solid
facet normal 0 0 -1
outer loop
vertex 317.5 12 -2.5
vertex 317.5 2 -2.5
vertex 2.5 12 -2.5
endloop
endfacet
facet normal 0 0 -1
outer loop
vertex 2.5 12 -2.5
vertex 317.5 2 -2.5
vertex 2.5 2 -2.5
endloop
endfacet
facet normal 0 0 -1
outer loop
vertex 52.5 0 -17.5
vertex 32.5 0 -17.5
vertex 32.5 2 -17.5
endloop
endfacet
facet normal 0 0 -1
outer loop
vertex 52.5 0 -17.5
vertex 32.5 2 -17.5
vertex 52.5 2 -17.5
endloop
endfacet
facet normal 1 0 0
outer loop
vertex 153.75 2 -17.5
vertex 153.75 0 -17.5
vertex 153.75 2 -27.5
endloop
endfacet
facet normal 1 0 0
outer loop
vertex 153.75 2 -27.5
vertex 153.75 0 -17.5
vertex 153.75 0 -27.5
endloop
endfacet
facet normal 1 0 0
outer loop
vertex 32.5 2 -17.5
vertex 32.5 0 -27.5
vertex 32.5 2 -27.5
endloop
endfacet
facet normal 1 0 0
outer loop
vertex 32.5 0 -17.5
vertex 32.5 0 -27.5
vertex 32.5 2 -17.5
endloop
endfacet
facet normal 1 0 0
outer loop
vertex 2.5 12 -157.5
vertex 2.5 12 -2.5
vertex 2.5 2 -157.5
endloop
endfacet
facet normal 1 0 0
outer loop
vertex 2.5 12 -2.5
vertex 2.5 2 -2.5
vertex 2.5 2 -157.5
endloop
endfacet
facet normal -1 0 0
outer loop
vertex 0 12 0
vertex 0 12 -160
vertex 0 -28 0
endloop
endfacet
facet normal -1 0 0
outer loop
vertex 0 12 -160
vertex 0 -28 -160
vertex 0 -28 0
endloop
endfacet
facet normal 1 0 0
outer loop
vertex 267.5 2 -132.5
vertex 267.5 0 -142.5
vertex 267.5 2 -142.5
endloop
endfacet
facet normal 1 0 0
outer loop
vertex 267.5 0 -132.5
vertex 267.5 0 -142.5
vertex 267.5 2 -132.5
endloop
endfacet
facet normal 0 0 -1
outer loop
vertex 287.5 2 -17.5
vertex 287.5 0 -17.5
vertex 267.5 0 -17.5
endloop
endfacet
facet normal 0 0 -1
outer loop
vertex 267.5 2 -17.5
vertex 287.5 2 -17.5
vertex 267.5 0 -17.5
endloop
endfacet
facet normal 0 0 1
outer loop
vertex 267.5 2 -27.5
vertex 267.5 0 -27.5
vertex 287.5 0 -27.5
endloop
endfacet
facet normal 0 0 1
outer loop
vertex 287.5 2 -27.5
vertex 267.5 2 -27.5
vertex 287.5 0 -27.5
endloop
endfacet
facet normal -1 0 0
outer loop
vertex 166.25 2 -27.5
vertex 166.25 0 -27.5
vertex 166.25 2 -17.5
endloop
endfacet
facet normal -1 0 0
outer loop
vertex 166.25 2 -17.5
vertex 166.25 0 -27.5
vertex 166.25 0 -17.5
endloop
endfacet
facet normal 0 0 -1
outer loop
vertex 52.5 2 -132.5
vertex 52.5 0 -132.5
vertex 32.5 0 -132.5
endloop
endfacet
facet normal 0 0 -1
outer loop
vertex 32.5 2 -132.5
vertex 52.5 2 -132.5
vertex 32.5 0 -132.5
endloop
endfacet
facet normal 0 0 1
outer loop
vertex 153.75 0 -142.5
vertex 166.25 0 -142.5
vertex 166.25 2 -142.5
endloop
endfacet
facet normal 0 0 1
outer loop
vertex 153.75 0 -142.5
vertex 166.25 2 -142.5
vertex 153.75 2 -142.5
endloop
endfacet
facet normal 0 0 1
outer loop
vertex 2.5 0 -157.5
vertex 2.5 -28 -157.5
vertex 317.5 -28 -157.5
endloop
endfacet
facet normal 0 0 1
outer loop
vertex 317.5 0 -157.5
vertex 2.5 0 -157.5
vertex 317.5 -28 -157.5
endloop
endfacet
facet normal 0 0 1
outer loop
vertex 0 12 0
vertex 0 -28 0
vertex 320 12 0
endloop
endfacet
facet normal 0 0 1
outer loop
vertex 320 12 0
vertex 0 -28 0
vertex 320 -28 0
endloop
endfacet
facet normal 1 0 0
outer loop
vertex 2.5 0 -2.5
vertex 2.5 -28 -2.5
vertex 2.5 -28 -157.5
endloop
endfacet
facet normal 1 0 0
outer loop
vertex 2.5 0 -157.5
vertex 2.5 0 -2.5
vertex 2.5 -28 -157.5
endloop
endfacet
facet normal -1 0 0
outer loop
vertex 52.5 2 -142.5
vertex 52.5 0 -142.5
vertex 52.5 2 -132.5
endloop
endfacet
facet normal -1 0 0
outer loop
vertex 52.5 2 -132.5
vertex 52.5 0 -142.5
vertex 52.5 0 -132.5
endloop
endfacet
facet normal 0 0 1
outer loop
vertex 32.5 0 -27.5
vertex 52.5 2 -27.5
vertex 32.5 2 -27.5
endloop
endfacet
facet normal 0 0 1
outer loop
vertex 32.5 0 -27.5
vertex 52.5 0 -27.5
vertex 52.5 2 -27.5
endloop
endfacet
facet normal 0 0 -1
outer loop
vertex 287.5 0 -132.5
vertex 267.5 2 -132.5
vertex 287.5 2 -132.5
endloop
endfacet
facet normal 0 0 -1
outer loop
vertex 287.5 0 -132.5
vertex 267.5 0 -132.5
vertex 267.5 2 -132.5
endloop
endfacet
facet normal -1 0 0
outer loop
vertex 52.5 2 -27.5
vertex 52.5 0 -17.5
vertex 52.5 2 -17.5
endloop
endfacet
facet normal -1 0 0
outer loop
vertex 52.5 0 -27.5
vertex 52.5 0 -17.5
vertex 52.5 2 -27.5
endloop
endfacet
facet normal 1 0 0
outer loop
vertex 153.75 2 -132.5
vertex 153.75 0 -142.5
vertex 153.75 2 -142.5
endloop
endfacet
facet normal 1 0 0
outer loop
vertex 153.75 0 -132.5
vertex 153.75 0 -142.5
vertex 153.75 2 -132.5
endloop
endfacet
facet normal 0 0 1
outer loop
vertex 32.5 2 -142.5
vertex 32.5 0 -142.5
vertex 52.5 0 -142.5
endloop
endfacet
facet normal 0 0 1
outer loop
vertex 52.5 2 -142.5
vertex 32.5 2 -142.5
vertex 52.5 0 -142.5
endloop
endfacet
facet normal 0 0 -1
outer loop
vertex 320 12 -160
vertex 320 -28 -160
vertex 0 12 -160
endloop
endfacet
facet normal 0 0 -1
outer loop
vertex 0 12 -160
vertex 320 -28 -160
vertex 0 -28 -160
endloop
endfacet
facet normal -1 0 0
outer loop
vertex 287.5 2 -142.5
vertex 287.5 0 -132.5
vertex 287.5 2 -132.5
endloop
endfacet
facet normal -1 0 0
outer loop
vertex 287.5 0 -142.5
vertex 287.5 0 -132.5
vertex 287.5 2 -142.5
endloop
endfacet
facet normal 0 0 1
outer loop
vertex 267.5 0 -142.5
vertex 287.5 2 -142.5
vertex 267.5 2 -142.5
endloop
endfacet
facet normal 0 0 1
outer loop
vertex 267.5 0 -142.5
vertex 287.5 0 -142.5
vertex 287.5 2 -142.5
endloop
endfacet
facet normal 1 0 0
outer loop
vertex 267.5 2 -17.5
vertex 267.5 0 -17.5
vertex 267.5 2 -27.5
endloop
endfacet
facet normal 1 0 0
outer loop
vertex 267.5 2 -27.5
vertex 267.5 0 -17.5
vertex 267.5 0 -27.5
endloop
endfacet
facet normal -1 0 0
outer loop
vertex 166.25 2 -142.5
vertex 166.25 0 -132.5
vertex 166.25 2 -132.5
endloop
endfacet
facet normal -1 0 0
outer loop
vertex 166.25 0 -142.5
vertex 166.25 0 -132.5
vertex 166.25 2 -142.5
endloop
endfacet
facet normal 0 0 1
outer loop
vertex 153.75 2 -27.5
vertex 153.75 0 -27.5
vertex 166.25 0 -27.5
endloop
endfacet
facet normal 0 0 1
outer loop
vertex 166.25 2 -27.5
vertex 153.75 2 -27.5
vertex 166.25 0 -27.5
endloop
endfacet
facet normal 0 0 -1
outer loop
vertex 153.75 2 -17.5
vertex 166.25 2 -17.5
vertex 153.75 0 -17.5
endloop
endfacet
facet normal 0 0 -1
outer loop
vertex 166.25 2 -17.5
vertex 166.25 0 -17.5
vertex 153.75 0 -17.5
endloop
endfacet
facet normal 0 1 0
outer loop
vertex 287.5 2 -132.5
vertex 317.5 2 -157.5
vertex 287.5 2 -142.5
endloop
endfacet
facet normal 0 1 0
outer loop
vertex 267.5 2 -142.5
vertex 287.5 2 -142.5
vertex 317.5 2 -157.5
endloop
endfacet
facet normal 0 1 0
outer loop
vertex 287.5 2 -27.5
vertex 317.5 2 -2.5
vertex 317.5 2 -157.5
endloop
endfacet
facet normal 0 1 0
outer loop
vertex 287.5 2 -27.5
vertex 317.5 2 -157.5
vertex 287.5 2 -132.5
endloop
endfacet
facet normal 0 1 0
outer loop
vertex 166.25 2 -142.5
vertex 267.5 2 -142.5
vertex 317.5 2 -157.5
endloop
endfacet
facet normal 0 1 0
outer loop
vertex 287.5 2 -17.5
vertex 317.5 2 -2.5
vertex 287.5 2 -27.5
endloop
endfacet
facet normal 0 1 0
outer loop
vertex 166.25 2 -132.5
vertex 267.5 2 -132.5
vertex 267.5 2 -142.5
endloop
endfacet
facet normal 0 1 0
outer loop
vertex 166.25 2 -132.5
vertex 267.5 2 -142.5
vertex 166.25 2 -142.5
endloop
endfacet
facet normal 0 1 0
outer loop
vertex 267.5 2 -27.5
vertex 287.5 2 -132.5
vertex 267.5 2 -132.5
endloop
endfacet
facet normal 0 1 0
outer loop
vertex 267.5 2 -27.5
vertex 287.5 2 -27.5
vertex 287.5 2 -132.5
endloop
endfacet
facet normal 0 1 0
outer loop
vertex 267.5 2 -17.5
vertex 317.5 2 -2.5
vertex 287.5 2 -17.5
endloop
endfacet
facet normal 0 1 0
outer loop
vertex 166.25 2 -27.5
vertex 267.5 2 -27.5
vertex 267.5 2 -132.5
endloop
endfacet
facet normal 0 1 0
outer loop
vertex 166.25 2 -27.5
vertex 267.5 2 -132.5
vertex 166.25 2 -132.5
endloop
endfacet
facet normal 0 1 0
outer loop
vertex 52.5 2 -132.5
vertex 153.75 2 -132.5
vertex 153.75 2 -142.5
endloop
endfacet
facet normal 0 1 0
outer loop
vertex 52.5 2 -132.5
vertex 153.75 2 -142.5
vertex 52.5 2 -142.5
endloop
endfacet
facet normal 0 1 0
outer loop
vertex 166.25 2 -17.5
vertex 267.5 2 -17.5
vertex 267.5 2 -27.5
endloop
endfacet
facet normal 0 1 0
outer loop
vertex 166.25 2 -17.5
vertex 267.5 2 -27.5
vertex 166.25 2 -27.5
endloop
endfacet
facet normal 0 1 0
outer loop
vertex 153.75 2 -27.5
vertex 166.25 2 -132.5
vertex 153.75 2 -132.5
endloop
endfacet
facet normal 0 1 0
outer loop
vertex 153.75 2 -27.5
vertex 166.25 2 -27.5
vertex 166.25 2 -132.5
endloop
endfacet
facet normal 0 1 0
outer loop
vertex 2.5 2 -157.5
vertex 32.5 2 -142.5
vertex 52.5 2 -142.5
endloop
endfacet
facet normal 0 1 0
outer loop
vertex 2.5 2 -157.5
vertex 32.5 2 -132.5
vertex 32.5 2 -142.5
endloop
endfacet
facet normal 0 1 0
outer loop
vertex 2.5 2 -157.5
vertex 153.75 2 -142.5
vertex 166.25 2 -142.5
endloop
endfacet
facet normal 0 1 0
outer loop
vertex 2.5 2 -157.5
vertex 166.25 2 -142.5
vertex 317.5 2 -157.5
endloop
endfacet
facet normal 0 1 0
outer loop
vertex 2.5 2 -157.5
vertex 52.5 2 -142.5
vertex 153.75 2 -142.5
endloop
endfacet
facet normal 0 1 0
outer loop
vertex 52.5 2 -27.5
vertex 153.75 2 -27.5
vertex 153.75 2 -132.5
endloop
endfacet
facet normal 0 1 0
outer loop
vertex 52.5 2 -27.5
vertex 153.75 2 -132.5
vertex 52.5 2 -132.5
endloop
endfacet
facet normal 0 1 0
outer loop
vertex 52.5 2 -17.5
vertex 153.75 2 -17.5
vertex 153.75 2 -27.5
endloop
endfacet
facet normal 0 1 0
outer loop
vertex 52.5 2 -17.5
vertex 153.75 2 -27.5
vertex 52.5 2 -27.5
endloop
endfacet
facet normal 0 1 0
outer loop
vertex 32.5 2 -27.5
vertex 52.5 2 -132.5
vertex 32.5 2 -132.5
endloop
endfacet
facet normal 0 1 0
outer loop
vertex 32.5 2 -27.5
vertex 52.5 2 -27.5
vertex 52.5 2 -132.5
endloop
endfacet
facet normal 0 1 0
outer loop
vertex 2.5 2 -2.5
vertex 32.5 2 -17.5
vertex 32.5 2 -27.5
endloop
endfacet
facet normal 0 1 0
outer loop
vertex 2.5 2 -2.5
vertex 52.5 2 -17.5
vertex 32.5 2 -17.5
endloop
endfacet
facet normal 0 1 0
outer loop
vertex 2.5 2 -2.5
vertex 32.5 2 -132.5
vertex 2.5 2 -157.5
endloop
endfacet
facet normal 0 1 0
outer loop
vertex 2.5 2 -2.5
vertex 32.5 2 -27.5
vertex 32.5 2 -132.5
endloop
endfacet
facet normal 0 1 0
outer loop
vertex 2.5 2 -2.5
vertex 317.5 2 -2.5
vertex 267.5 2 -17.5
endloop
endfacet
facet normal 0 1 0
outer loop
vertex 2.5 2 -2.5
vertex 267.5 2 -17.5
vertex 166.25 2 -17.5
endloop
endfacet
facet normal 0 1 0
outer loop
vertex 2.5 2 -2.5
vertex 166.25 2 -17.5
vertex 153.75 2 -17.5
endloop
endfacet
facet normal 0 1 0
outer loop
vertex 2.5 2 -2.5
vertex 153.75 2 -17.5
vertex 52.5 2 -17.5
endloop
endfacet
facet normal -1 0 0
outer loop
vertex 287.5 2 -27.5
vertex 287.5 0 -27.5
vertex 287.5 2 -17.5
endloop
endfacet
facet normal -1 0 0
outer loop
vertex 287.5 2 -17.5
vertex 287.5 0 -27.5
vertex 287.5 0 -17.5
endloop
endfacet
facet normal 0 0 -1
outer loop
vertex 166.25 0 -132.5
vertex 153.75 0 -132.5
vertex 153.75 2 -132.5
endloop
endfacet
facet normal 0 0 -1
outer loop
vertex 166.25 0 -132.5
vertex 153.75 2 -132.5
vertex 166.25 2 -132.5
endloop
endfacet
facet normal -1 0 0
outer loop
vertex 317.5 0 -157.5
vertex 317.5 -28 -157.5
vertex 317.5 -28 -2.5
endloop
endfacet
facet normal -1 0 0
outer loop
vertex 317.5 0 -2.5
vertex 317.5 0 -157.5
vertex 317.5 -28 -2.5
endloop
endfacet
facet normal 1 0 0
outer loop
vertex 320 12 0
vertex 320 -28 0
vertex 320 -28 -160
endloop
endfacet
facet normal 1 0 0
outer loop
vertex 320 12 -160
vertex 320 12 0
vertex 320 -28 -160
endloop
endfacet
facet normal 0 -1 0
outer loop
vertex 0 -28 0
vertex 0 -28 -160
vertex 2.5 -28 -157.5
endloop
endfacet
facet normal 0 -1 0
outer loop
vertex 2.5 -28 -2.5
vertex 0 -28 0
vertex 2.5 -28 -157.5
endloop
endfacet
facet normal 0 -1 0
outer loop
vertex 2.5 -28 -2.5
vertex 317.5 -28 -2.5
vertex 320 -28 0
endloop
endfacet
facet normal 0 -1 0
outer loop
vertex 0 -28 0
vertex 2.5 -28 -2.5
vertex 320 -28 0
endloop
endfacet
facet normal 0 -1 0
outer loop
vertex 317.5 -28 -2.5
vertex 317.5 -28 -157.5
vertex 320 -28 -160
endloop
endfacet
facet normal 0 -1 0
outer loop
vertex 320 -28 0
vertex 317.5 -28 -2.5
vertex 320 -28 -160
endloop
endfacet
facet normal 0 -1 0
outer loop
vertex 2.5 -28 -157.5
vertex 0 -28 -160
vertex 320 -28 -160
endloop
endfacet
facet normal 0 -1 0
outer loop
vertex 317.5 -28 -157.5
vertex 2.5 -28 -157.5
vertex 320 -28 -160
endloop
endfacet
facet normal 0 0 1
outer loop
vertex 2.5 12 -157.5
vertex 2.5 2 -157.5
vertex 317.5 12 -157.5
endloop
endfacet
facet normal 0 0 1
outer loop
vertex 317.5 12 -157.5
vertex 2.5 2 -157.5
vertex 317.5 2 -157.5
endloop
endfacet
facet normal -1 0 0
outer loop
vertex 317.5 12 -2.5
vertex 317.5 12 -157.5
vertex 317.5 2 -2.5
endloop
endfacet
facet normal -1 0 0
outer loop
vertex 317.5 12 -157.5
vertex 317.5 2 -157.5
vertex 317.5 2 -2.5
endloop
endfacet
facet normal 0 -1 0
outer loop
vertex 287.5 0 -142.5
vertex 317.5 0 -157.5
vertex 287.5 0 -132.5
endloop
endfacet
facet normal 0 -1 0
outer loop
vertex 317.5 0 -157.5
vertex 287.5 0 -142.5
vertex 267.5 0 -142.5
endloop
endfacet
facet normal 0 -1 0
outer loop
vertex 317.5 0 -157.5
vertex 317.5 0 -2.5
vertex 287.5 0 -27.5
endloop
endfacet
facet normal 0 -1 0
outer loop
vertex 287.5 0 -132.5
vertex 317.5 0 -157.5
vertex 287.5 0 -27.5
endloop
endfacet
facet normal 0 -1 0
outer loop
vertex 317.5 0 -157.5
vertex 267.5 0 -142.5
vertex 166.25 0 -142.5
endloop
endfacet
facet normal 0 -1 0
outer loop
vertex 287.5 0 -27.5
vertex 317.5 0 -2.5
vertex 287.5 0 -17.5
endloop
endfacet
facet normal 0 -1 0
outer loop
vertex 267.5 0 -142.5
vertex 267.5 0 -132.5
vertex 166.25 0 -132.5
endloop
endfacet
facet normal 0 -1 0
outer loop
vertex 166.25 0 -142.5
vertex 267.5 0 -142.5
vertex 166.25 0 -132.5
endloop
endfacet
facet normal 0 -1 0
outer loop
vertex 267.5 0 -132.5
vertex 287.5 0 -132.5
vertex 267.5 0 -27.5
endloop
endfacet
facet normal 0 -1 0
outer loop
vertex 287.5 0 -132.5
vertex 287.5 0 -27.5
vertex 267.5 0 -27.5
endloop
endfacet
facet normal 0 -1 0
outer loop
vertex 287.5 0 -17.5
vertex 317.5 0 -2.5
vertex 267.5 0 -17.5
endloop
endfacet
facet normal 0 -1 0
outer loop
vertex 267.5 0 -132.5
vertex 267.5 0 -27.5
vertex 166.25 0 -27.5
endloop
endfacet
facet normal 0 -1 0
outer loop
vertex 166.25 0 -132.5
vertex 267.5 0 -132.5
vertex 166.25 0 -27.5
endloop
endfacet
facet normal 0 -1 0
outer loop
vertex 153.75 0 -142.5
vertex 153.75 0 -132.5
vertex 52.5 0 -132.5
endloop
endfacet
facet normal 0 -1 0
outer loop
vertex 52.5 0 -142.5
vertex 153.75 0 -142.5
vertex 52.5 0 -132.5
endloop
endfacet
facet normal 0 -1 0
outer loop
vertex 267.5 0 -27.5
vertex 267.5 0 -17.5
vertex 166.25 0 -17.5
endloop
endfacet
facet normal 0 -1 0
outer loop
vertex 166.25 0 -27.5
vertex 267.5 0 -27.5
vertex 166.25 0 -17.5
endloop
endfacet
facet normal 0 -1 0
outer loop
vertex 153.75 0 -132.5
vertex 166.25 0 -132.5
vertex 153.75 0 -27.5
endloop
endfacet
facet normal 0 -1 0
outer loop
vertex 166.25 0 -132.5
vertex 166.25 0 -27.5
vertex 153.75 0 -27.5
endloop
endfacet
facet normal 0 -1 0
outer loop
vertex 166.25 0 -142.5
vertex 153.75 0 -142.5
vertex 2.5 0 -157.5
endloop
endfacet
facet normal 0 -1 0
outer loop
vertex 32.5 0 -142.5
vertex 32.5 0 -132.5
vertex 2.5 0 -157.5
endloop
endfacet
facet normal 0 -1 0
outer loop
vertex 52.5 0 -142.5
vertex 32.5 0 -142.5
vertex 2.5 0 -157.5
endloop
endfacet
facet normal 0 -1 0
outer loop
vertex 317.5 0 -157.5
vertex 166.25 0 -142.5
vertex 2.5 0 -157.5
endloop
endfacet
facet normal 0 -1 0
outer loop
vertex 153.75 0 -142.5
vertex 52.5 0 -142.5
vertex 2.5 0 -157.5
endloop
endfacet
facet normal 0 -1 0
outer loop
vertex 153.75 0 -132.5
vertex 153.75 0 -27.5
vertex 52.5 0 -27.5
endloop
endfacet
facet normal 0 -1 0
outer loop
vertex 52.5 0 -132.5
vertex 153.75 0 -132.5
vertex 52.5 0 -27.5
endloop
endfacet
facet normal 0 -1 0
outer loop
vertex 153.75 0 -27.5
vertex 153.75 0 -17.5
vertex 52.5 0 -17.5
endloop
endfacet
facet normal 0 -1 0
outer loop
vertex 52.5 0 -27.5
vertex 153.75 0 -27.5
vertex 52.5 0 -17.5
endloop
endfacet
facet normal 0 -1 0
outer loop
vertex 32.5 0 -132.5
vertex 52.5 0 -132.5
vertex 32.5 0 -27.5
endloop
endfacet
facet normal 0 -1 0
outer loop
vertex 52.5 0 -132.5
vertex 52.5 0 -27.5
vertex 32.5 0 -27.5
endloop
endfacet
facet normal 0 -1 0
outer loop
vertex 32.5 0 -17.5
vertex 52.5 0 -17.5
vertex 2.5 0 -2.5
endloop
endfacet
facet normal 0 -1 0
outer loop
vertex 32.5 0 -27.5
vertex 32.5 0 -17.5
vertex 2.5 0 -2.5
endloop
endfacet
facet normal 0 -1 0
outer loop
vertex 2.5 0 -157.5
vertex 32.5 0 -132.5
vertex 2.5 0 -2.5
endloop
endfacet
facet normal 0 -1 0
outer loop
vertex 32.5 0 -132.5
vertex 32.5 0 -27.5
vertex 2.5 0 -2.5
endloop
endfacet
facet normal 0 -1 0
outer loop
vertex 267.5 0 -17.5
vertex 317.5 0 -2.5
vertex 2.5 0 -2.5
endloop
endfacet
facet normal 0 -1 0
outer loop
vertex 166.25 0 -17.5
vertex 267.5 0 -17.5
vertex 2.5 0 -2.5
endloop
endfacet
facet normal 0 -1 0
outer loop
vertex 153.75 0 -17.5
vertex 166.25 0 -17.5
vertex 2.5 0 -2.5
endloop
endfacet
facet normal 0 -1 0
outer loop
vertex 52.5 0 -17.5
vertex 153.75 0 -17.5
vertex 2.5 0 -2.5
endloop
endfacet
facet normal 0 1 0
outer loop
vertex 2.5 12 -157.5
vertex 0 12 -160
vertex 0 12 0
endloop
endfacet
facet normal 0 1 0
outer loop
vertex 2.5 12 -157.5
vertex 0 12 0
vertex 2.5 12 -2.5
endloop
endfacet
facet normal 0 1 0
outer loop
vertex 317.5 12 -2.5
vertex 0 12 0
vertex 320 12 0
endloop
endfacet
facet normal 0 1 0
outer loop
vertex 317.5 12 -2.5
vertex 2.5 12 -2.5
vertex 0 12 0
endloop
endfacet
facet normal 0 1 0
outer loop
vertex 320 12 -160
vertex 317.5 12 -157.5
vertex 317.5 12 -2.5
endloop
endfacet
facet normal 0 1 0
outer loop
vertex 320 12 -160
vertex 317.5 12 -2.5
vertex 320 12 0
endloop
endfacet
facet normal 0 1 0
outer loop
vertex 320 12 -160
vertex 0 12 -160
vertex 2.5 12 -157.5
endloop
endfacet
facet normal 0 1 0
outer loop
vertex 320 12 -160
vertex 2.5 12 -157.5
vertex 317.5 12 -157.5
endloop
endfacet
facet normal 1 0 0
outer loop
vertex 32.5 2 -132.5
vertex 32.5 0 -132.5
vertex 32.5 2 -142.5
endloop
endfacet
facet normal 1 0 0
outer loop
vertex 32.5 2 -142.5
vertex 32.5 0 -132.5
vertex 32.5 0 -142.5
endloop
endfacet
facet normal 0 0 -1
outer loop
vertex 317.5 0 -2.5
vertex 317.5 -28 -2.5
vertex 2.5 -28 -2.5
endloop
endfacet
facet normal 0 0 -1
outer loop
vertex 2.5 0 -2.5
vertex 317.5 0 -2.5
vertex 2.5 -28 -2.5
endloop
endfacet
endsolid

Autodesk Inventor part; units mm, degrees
ref_plane "YZ Plane" through (0, 0, 0) normal (1, 0, 0) x (0, 1, 0)
ref_plane "XZ Plane" through (0, 0, 0) normal (0, 1, 0) x (-1, 0, 0)
ref_plane "XY Plane" through (0, 0, 0) normal (0, 0, 1) x (1, 0, 0)
sketch "Sketch1" plane through (0, 0, 0) normal (0, 1, 0) x (-1, 0, 0)
  line L0 (0, 0) -> (-320, 0)
  line L1 (-320, 0) -> (-320, -160)
  line L2 (-320, -160) -> (0, -160)
  line L3 (0, -160) -> (0, 0)
  line L4 (-2.5, -157.5) -> (-317.5, -157.5)
  line L5 (-317.5, -157.5) -> (-317.5, -2.5)
  line L6 (-317.5, -2.5) -> (-2.5, -2.5)
  line L7 (-2.5, -2.5) -> (-2.5, -157.5)
  line L8 (-32.5, -142.5) -> (-52.5, -142.5)
  line L9 (-52.5, -142.5) -> (-52.5, -132.5)
  line L10 (-52.5, -132.5) -> (-32.5, -132.5)
  line L11 (-32.5, -132.5) -> (-32.5, -142.5)
  line L12 (-287.5, -142.5) -> (-267.5, -142.5)
  line L13 (-267.5, -142.5) -> (-267.5, -132.5)
  line L14 (-267.5, -132.5) -> (-287.5, -132.5)
  line L15 (-287.5, -132.5) -> (-287.5, -142.5)
  line L16 (-166.25, -142.5) -> (-153.75, -142.5)
  line L17 (-153.75, -142.5) -> (-153.75, -132.5)
  line L18 (-153.75, -132.5) -> (-166.25, -132.5)
  line L19 (-166.25, -132.5) -> (-166.25, -142.5)
  line L20 (-2.5, -80) -> (-317.5, -80)
  line L21 (-32.5, -17.5) -> (-52.5, -17.5)
  line L22 (-52.5, -17.5) -> (-52.5, -27.5)
  line L23 (-52.5, -27.5) -> (-32.5, -27.5)
  line L24 (-32.5, -27.5) -> (-32.5, -17.5)
  line L25 (-287.5, -17.5) -> (-267.5, -17.5)
  line L26 (-267.5, -17.5) -> (-267.5, -27.5)
  line L27 (-267.5, -27.5) -> (-287.5, -27.5)
  line L28 (-287.5, -27.5) -> (-287.5, -17.5)
  line L29 (-166.25, -17.5) -> (-153.75, -17.5)
  line L30 (-153.75, -17.5) -> (-153.75, -27.5)
  line L31 (-153.75, -27.5) -> (-166.25, -27.5)
  line L32 (-166.25, -27.5) -> (-166.25, -17.5)
  point P0 (-32.5, -137.5)
  point P1 (-42.5, -142.5)
  point P2 (-277.5, -142.5)
  point P3 (-287.5, -137.5)
  point P4 (-52.5, -137.5)
  point P5 (-267.5, -137.5)
  point P6 (-160, -142.5)
  point P7 (-32.5, -22.5)
  point P8 (-42.5, -17.5)
  point P9 (-277.5, -17.5)
  point P10 (-287.5, -22.5)
  point P11 (-52.5, -22.5)
  point P12 (-267.5, -22.5)
  point P13 (-160, -17.5)
  dimension "d0" = 320
  dimension "d1" = 160
  dimension "d2" = 2.5
  dimension "d7" = 30
  dimension "d8" = 15
  dimension "d9" = 20
  dimension "d10" = 10
  dimension "d11" = 20
  dimension "d12" = 10
  dimension "d13" = 15
  dimension "d14" = 30
  dimension "d16" = 215
  dimension "d18" = 10
  dimension "d19" = 12.5
  dimension "d23" = 160
  dimension "d25" = 15
extrude "Extrusion1" add sketch "Sketch1" along normal blind 2 contours L3 L2 L1 L0 | L4 L5 L20 L7 | L20 L5 L6 L7
sketch "Sketch2" plane through (0, 2, 0) normal (0, 1, 0) x (1, 0, 0)
  line L0 (320, 0) -> (320, 160) projected
  line L1 (320, 160) -> (0, 160) projected
  line L2 (0, 160) -> (0, 0) projected
  line L3 (0, 0) -> (320, 0) projected
  line L4 (32.5, 142.5) -> (52.5, 142.5) projected
  line L5 (52.5, 142.5) -> (52.5, 132.5) projected
  line L6 (52.5, 132.5) -> (32.5, 132.5) projected
  line L7 (32.5, 132.5) -> (32.5, 142.5) projected
  line L8 (287.5, 142.5) -> (287.5, 132.5) projected
  line L9 (287.5, 132.5) -> (267.5, 132.5) projected
  line L10 (267.5, 132.5) -> (267.5, 142.5) projected
  line L11 (267.5, 142.5) -> (287.5, 142.5) projected
  line L12 (166.25, 142.5) -> (166.25, 132.5) projected
  line L13 (166.25, 132.5) -> (153.75, 132.5) projected
  line L14 (153.75, 132.5) -> (153.75, 142.5) projected
  line L15 (153.75, 142.5) -> (166.25, 142.5) projected
  line L16 (52.5, 17.5) -> (32.5, 17.5) projected
  line L17 (32.5, 17.5) -> (32.5, 27.5) projected
  line L18 (32.5, 27.5) -> (52.5, 27.5) projected
  line L19 (52.5, 27.5) -> (52.5, 17.5) projected
  line L20 (267.5, 17.5) -> (267.5, 27.5) projected
  line L21 (267.5, 27.5) -> (287.5, 27.5) projected
  line L22 (287.5, 27.5) -> (287.5, 17.5) projected
  line L23 (287.5, 17.5) -> (267.5, 17.5) projected
  line L24 (166.25, 27.5) -> (166.25, 17.5) projected
  line L25 (166.25, 17.5) -> (153.75, 17.5) projected
  line L26 (153.75, 17.5) -> (153.75, 27.5) projected
  line L27 (153.75, 27.5) -> (166.25, 27.5) projected
  line L28 (2.5, 2.5) -> (2.5, 157.5)
  line L29 (2.5, 157.5) -> (317.5, 157.5)
  line L30 (317.5, 157.5) -> (317.5, 2.5)
  line L31 (317.5, 2.5) -> (2.5, 2.5)
  dimension "d26" = 2.5
extrude "Extrusion2" add sketch "Sketch2" along normal blind 10 and the other way blind 30 contours L3 L2 L1 L0
sketch "Sketch3" plane through (0, -28, 0) normal (0, -1, 0) x (1, 0, 0)
  line L0 (0, 0) -> (0, -160) projected
  line L1 (0, -160) -> (320, -160) projected
  line L2 (320, -160) -> (320, 0) projected
  line L3 (320, 0) -> (0, 0) projected
properties part number "led_spectrum_frame"
